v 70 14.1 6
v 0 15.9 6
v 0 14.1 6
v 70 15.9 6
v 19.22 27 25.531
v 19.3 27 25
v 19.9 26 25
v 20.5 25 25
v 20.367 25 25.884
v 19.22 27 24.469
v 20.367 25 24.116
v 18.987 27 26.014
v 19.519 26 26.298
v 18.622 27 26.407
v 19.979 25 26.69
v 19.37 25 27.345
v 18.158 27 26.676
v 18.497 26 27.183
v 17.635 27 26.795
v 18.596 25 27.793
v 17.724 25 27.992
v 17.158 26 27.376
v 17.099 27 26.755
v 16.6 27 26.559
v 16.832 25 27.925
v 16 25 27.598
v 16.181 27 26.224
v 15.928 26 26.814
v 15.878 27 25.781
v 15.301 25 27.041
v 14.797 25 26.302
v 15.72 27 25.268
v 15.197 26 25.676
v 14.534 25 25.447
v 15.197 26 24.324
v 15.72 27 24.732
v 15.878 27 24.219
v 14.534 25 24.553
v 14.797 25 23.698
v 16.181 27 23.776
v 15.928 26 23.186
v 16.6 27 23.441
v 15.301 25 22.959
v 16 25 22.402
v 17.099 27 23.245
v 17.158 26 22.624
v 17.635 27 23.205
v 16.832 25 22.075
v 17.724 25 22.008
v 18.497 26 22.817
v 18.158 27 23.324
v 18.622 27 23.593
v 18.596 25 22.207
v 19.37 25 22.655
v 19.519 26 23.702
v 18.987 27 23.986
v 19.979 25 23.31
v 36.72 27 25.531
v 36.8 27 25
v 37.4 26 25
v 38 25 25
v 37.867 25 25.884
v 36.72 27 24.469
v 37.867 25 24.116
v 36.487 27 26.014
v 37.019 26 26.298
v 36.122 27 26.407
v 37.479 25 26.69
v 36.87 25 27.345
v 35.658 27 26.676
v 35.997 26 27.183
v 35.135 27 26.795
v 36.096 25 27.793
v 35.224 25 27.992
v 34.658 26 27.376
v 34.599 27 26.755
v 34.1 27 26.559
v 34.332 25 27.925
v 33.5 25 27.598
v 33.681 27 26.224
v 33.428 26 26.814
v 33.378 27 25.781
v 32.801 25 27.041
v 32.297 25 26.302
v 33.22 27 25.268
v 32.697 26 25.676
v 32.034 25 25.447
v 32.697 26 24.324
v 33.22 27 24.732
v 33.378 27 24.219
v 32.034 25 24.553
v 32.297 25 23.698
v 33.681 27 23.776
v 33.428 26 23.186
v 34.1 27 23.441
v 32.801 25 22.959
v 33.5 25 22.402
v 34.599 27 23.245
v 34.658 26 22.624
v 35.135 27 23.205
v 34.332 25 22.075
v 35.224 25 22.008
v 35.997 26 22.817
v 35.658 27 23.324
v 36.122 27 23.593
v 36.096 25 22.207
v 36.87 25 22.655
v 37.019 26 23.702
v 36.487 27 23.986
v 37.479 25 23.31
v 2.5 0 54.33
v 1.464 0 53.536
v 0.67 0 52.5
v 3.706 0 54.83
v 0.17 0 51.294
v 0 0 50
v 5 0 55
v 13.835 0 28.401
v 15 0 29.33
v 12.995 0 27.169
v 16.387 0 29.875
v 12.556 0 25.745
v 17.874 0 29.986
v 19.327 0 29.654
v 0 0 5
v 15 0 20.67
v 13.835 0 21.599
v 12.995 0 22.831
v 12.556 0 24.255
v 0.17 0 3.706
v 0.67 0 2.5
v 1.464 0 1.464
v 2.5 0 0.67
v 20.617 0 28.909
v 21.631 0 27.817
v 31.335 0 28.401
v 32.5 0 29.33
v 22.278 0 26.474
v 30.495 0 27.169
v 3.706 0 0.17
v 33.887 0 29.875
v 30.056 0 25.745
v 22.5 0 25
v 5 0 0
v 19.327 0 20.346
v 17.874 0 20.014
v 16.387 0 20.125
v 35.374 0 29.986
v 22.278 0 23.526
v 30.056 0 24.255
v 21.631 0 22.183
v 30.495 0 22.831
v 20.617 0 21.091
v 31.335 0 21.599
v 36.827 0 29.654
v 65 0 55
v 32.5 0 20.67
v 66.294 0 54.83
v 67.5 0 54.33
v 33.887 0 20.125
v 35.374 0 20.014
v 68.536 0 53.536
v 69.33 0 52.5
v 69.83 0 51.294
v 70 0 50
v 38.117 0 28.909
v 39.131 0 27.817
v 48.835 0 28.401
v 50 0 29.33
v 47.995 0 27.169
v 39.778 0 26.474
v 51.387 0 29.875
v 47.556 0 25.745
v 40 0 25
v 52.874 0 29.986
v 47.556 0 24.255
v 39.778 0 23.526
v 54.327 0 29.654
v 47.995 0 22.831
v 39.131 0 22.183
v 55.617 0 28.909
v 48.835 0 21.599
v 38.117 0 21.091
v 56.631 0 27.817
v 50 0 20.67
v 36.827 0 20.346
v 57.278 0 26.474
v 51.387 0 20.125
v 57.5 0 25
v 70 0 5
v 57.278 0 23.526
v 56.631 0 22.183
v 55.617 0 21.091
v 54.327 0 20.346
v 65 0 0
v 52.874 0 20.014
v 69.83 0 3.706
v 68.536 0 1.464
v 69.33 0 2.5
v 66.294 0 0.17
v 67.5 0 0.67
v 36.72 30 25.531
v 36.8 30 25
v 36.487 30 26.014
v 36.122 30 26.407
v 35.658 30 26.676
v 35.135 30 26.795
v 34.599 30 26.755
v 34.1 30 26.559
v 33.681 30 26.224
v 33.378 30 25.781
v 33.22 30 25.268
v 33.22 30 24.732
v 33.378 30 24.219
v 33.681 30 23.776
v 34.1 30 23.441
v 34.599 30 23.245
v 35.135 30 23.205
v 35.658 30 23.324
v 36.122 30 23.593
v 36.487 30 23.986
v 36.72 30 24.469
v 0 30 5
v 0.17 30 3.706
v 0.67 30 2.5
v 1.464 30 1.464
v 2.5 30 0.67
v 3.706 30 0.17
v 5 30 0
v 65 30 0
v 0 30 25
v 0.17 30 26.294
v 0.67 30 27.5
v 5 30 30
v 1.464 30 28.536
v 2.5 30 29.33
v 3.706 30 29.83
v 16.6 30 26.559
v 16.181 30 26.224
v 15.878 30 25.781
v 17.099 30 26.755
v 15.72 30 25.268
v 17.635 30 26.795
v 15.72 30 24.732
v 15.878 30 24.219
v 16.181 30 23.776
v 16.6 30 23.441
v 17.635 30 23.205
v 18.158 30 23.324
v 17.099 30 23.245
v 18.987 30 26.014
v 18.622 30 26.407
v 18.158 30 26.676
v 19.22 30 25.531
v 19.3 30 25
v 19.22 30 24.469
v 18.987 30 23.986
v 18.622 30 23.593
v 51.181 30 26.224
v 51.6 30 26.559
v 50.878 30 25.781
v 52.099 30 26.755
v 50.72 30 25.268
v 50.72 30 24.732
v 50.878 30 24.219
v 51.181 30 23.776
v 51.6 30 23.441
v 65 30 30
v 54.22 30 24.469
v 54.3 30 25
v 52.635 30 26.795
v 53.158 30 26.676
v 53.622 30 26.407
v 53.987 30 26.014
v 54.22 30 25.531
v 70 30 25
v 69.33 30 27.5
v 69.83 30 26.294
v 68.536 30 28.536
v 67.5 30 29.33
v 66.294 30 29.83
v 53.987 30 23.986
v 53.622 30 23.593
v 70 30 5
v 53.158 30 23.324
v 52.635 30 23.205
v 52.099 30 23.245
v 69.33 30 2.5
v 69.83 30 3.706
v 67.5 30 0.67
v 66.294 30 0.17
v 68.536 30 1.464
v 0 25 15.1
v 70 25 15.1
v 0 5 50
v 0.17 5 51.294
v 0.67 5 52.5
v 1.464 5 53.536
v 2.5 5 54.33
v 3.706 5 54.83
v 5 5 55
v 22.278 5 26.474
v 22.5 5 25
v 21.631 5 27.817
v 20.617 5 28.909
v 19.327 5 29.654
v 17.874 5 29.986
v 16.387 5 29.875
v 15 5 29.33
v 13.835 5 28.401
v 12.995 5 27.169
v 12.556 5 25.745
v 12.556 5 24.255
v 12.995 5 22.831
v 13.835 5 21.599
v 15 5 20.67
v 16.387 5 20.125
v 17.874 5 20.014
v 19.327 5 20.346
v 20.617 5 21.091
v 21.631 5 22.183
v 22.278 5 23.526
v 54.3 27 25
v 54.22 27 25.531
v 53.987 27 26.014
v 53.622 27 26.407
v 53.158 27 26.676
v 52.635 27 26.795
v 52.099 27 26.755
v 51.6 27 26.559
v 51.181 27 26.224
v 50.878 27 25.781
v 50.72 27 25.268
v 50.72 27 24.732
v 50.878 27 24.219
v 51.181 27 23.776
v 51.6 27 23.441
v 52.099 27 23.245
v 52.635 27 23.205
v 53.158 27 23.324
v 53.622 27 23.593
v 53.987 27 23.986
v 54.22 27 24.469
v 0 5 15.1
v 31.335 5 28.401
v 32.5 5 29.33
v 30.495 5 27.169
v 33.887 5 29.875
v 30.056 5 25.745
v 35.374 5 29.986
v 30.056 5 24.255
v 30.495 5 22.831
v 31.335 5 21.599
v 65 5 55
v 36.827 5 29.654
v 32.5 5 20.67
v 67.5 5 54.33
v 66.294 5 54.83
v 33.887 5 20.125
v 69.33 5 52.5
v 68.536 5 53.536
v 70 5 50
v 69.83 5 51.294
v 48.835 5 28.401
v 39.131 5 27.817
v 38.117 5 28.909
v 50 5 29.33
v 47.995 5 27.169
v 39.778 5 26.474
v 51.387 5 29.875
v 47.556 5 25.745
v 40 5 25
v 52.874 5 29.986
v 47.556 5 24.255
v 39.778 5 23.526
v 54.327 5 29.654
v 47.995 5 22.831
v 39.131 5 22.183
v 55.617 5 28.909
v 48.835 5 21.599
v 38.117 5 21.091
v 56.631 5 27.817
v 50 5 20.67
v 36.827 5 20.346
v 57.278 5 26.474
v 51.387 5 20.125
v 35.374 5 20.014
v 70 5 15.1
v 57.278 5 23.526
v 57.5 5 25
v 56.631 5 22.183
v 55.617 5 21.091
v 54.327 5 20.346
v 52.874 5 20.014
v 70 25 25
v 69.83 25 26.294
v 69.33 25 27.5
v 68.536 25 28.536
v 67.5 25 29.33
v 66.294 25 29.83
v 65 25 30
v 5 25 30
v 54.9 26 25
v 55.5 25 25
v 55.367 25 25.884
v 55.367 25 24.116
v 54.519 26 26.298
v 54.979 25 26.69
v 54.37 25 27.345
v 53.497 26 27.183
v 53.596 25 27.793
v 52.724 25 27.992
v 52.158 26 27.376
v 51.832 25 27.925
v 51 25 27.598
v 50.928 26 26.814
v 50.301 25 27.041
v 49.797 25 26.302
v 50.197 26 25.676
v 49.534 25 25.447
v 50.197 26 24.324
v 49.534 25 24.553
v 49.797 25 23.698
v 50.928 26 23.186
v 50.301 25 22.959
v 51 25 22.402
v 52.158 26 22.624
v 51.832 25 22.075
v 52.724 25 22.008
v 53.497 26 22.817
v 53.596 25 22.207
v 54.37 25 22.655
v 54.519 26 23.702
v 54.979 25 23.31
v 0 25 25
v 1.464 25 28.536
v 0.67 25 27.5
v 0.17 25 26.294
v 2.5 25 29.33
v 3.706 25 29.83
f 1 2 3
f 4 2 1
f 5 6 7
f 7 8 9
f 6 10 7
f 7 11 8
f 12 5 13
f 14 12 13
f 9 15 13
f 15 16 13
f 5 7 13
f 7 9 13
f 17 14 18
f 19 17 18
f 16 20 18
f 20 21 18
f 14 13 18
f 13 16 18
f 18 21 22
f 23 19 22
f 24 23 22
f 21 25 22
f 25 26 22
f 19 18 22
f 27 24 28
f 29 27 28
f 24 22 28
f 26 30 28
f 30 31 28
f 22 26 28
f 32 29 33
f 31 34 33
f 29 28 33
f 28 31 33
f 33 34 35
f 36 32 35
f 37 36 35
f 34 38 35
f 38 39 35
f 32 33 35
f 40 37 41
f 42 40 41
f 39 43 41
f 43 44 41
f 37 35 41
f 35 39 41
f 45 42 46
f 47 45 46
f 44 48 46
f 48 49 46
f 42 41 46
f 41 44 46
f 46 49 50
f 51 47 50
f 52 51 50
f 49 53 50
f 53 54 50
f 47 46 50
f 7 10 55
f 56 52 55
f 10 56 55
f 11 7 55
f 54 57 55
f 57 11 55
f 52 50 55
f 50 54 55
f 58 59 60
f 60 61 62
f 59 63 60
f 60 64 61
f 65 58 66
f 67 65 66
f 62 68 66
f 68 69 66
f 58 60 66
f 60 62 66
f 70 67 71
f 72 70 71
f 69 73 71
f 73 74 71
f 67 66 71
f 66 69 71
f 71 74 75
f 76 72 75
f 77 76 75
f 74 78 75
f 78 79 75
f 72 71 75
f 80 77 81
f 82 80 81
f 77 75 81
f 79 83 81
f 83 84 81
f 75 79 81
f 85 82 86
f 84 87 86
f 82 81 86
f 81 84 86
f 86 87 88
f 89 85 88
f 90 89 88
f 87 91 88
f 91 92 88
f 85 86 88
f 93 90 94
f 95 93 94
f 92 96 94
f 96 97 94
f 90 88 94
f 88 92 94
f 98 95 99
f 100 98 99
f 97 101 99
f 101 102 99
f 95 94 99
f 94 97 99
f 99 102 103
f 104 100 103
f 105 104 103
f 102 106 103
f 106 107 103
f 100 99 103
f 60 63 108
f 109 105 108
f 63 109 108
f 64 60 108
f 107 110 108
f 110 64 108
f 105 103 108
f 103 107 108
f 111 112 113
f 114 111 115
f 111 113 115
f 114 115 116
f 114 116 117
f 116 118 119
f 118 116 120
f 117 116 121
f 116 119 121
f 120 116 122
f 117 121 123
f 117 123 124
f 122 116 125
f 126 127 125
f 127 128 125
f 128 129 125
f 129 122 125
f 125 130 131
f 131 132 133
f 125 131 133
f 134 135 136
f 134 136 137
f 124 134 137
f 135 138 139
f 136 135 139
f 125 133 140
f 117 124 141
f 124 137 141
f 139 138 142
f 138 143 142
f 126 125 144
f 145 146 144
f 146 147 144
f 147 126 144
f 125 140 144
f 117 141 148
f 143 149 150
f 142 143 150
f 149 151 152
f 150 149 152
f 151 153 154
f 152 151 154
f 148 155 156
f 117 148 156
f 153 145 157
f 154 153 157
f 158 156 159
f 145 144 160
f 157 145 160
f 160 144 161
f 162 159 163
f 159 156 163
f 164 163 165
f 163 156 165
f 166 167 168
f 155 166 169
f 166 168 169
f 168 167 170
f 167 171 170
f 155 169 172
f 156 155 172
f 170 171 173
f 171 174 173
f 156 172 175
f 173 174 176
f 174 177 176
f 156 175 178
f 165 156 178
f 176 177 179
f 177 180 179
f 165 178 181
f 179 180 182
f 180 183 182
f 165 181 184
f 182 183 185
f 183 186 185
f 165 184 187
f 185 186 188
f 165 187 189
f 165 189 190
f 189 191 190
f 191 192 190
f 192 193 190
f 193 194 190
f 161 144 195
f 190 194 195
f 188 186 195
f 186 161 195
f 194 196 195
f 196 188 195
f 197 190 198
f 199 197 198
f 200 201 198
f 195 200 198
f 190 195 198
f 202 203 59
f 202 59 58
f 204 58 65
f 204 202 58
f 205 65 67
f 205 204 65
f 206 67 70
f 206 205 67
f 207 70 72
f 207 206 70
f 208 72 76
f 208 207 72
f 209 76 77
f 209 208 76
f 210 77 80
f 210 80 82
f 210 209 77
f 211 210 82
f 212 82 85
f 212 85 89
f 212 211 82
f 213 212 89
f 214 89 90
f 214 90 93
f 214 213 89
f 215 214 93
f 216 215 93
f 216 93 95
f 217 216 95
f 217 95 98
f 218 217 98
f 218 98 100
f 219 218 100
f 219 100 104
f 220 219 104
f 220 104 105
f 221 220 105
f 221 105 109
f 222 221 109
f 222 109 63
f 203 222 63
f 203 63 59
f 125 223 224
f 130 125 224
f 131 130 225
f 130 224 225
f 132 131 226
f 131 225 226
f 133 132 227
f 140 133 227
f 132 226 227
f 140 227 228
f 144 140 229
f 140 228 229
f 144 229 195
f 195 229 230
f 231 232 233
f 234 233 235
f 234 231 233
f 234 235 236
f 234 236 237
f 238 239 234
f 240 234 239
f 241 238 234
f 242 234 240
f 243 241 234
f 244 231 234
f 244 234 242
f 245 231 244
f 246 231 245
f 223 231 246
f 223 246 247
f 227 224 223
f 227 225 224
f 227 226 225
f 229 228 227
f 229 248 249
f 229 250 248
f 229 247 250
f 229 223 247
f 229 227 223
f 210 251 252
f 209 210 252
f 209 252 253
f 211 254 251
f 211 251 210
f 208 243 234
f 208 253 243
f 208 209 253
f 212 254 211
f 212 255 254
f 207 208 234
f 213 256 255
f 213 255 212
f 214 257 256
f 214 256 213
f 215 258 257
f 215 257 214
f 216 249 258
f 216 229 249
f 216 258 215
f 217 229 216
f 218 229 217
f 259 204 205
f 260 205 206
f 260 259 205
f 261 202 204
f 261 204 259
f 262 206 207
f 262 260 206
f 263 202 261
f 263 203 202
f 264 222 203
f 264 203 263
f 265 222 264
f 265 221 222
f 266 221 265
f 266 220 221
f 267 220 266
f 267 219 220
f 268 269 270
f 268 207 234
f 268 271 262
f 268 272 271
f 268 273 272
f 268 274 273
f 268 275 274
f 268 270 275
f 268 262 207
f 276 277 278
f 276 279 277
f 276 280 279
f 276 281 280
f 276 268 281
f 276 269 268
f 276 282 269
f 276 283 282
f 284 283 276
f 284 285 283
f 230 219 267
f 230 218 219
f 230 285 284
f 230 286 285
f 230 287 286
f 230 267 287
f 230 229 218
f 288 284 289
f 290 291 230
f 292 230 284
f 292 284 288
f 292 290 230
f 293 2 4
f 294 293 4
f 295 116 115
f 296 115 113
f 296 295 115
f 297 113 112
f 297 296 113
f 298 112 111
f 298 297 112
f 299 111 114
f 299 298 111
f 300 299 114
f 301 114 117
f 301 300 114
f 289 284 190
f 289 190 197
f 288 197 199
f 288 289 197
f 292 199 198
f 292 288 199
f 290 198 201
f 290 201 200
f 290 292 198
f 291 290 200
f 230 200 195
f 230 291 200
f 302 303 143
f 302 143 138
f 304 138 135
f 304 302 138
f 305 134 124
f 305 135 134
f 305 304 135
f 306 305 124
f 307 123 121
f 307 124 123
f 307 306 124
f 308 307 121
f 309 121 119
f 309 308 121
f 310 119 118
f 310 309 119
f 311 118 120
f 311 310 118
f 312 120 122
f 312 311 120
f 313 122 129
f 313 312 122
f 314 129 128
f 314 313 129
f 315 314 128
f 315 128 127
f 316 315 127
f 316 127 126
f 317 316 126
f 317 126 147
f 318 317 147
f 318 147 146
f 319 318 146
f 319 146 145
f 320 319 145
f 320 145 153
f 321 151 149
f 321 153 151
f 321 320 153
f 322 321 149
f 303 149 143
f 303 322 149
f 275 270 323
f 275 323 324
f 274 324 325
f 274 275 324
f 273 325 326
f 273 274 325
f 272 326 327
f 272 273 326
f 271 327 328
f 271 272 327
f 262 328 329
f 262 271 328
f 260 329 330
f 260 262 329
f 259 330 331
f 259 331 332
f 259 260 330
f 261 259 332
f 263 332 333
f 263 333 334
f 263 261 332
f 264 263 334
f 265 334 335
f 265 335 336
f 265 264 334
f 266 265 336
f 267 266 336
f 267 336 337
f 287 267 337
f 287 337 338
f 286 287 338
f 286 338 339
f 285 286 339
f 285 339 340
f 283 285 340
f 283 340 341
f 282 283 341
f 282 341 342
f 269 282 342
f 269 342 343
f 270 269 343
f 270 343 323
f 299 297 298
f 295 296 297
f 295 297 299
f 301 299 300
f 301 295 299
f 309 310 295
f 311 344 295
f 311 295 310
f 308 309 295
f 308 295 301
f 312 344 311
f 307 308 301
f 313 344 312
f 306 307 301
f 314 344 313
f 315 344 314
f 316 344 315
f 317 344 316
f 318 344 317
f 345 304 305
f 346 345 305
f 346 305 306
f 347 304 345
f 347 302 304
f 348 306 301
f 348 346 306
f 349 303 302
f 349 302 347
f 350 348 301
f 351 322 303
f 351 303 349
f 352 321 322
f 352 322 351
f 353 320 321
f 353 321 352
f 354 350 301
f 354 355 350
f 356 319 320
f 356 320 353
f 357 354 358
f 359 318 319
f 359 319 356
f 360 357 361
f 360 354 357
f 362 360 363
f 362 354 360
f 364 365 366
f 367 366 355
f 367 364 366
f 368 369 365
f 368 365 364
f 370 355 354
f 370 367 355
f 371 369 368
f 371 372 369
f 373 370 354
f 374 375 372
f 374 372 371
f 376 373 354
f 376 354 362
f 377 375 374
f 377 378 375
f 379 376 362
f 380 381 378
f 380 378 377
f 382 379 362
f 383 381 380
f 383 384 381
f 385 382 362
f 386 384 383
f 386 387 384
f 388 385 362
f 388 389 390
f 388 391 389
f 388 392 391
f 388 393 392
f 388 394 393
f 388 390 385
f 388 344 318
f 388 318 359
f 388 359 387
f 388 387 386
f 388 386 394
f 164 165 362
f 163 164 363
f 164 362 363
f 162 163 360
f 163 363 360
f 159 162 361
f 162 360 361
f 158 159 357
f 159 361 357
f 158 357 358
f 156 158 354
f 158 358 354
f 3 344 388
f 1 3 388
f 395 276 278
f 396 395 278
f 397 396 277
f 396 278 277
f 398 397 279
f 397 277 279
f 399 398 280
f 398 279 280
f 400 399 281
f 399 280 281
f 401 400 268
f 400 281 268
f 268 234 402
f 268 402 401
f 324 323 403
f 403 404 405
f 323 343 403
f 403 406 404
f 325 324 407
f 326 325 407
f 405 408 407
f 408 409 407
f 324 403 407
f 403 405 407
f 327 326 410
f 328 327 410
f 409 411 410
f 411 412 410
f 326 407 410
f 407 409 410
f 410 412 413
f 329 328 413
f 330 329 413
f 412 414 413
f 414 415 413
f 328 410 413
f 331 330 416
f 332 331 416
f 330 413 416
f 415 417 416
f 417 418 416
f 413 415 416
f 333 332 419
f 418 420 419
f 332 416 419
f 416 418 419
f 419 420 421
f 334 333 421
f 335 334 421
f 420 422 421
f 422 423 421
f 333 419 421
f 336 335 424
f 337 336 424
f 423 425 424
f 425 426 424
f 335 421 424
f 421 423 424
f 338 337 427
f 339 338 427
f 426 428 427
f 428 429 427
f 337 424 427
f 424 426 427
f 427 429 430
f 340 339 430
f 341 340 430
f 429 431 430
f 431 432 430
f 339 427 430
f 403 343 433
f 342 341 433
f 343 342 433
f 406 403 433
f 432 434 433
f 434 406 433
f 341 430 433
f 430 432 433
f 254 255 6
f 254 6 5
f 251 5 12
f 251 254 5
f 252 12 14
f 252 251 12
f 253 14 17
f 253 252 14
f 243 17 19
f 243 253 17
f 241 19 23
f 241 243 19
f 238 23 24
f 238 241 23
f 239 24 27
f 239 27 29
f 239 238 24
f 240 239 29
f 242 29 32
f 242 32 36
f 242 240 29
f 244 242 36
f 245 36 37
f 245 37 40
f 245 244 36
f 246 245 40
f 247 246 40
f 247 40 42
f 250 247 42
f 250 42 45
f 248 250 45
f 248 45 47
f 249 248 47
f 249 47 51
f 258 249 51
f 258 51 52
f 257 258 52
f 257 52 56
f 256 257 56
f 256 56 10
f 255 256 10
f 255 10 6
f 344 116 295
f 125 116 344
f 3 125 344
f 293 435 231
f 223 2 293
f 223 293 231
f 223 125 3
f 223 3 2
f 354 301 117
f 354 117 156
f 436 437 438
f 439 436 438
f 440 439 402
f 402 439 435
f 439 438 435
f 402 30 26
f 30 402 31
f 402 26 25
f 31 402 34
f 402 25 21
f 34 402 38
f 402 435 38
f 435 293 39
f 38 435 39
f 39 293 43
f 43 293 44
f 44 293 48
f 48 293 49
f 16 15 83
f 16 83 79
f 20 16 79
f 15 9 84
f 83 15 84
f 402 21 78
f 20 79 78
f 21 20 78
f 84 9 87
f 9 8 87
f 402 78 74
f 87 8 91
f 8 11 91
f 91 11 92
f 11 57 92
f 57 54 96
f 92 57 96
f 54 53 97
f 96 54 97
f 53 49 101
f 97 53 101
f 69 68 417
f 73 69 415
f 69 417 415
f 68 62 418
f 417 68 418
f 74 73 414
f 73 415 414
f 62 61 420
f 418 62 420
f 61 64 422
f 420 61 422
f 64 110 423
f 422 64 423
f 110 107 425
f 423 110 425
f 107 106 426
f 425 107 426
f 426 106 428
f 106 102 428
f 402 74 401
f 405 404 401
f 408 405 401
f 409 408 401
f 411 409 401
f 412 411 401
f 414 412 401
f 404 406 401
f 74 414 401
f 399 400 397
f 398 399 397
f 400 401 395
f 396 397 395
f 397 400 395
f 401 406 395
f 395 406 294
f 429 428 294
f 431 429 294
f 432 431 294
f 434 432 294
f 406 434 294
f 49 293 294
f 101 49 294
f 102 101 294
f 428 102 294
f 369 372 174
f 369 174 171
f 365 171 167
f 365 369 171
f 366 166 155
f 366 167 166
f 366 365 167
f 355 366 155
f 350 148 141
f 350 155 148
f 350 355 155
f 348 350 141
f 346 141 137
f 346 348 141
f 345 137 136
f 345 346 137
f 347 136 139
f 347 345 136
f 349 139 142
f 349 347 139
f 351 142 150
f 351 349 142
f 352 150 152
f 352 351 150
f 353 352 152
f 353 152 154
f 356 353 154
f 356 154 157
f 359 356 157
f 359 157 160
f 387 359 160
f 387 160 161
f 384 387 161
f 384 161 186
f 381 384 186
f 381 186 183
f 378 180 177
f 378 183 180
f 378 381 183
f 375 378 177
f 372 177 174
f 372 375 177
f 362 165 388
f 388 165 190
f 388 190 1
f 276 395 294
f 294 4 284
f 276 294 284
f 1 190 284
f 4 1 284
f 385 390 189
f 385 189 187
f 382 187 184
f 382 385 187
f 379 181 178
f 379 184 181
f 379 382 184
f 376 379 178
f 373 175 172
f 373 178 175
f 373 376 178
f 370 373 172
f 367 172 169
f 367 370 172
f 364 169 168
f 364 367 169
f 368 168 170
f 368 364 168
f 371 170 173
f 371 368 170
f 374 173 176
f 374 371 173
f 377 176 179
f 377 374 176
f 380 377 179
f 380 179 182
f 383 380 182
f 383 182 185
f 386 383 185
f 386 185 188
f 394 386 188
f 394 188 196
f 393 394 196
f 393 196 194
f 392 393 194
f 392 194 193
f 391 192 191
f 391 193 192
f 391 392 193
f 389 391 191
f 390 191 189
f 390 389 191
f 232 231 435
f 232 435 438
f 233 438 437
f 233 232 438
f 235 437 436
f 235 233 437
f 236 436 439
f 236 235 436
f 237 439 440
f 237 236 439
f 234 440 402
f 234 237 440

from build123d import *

# Parameters (mm, degrees)
CYLINDER001_R         = 1.8
CYLINDER001_DEPTH     = 5
CYLINDER_R            = 5
CYLINDER_DEPTH        = 30
ARRAY_X_COUNT         = 3
ARRAY_X_PITCH         = 17.5
ARRAY_PLACEMENT_ANGLE = 90
BOX001_W              = 70
BOX001_H              = 20
BOX001_DEPTH          = 50
BOX002_W              = 70
BOX002_H              = 15
BOX002_DEPTH          = 30
FILLET002_R           = 5
BOX_W                 = 70
BOX_H                 = 15
BOX_DEPTH             = 55
FILLET001_R           = 5
CHAMFER_SIZE          = 9.1


with BuildPart() as screw_hole:
    # Cylinder001 → Cylinder001 (new body)
    with BuildSketch(Plane.XY):
        Circle(CYLINDER001_R)
    extrude(amount=CYLINDER001_DEPTH)


with BuildPart() as screw_driver_hole:
    # Cylinder → Cylinder (new body)
    with BuildSketch(Plane.XY.offset(7)):
        Circle(CYLINDER_R)
    extrude(amount=CYLINDER_DEPTH)


with BuildPart() as hole_array:
    # Cone → Cone (revolve)
    with BuildSketch(Plane(origin=(0, 0, 5), x_dir=(1, 0, 0), z_dir=(0, -1, 0))):
        Polygon((0, 0), (1.8, 0), (3, 2), (0, 2), align=None)
    revolve(axis=Axis((0, 0, 5), (0, 0, 1)))

    # Fusion: union screw hole, screw driver hole
    add(screw_hole.part)
    add(screw_driver_hole.part)

    # Array X: hole array ×3


with BuildPart() as hole_array_1:
    add(hole_array.part)
    with Locations(*[(i * ARRAY_X_PITCH, 0, 0) for i in range(1, ARRAY_X_COUNT)]):
        add(hole_array.part)


with BuildPart() as hole_array_2:
    # Array placement: moved
    add(hole_array_1.part.moved(Location((17.5, 32, 25))).rotate(Axis((17.5, 32, 25), (1, 0, 0)), ARRAY_PLACEMENT_ANGLE))


with BuildPart() as internal_cube:
    # Box001 → Box001 (new body)
    with BuildSketch(Plane(origin=(0, 5, 6), x_dir=(1, 0, 0), z_dir=(0, 0, 1))):
        with Locations((35, 10)):
            Rectangle(BOX001_W, BOX001_H)
    extrude(amount=BOX001_DEPTH)


with BuildPart() as external_hole_side_half_fillet:
    # Box002 → Box002 (new body)
    with BuildSketch(Plane(origin=(0, 15, 0), x_dir=(1, 0, 0), z_dir=(0, 0, 1))):
        with Locations((35, 7.5)):
            Rectangle(BOX002_W, BOX002_H)
    extrude(amount=BOX002_DEPTH)

    # Fillet002
    fillet002_edges = [external_hole_side_half_fillet.edges().sort_by_distance(p)[0] for p in [
        (0, 22.5, 30),
        (0, 22.5, 0),
        (70, 22.5, 30),
        (70, 22.5, 0),
    ]]
    fillet(fillet002_edges, radius=FILLET002_R)


with BuildPart() as wire_hanger_cut001:
    # Box → Box (new body)
    with BuildSketch(Plane.XY):
        with Locations((35, 7.5)):
            Rectangle(BOX_W, BOX_H)
    extrude(amount=BOX_DEPTH)

    # Fillet001
    fillet001_edges = [wire_hanger_cut001.edges().sort_by_distance(p)[0] for p in [
        (0, 7.5, 55),
        (0, 7.5, 0),
        (70, 7.5, 55),
        (70, 7.5, 0),
    ]]
    fillet(fillet001_edges, radius=FILLET001_R)

    # Fusion001: union external hole side half fillet
    add(external_hole_side_half_fillet.part)

    # Cut: cut internal cube
    add(internal_cube.part, mode=Mode.SUBTRACT)

    # Chamfer
    chamfer_edges = [wire_hanger_cut001.edges().sort_by_distance(p)[0] for p in [
        (35, 5, 6),
        (35, 25, 6),
    ]]
    chamfer(chamfer_edges, length=CHAMFER_SIZE)

    # Cut001: cut hole array
    add(hole_array_2.part, mode=Mode.SUBTRACT)


solid = wire_hanger_cut001.part
